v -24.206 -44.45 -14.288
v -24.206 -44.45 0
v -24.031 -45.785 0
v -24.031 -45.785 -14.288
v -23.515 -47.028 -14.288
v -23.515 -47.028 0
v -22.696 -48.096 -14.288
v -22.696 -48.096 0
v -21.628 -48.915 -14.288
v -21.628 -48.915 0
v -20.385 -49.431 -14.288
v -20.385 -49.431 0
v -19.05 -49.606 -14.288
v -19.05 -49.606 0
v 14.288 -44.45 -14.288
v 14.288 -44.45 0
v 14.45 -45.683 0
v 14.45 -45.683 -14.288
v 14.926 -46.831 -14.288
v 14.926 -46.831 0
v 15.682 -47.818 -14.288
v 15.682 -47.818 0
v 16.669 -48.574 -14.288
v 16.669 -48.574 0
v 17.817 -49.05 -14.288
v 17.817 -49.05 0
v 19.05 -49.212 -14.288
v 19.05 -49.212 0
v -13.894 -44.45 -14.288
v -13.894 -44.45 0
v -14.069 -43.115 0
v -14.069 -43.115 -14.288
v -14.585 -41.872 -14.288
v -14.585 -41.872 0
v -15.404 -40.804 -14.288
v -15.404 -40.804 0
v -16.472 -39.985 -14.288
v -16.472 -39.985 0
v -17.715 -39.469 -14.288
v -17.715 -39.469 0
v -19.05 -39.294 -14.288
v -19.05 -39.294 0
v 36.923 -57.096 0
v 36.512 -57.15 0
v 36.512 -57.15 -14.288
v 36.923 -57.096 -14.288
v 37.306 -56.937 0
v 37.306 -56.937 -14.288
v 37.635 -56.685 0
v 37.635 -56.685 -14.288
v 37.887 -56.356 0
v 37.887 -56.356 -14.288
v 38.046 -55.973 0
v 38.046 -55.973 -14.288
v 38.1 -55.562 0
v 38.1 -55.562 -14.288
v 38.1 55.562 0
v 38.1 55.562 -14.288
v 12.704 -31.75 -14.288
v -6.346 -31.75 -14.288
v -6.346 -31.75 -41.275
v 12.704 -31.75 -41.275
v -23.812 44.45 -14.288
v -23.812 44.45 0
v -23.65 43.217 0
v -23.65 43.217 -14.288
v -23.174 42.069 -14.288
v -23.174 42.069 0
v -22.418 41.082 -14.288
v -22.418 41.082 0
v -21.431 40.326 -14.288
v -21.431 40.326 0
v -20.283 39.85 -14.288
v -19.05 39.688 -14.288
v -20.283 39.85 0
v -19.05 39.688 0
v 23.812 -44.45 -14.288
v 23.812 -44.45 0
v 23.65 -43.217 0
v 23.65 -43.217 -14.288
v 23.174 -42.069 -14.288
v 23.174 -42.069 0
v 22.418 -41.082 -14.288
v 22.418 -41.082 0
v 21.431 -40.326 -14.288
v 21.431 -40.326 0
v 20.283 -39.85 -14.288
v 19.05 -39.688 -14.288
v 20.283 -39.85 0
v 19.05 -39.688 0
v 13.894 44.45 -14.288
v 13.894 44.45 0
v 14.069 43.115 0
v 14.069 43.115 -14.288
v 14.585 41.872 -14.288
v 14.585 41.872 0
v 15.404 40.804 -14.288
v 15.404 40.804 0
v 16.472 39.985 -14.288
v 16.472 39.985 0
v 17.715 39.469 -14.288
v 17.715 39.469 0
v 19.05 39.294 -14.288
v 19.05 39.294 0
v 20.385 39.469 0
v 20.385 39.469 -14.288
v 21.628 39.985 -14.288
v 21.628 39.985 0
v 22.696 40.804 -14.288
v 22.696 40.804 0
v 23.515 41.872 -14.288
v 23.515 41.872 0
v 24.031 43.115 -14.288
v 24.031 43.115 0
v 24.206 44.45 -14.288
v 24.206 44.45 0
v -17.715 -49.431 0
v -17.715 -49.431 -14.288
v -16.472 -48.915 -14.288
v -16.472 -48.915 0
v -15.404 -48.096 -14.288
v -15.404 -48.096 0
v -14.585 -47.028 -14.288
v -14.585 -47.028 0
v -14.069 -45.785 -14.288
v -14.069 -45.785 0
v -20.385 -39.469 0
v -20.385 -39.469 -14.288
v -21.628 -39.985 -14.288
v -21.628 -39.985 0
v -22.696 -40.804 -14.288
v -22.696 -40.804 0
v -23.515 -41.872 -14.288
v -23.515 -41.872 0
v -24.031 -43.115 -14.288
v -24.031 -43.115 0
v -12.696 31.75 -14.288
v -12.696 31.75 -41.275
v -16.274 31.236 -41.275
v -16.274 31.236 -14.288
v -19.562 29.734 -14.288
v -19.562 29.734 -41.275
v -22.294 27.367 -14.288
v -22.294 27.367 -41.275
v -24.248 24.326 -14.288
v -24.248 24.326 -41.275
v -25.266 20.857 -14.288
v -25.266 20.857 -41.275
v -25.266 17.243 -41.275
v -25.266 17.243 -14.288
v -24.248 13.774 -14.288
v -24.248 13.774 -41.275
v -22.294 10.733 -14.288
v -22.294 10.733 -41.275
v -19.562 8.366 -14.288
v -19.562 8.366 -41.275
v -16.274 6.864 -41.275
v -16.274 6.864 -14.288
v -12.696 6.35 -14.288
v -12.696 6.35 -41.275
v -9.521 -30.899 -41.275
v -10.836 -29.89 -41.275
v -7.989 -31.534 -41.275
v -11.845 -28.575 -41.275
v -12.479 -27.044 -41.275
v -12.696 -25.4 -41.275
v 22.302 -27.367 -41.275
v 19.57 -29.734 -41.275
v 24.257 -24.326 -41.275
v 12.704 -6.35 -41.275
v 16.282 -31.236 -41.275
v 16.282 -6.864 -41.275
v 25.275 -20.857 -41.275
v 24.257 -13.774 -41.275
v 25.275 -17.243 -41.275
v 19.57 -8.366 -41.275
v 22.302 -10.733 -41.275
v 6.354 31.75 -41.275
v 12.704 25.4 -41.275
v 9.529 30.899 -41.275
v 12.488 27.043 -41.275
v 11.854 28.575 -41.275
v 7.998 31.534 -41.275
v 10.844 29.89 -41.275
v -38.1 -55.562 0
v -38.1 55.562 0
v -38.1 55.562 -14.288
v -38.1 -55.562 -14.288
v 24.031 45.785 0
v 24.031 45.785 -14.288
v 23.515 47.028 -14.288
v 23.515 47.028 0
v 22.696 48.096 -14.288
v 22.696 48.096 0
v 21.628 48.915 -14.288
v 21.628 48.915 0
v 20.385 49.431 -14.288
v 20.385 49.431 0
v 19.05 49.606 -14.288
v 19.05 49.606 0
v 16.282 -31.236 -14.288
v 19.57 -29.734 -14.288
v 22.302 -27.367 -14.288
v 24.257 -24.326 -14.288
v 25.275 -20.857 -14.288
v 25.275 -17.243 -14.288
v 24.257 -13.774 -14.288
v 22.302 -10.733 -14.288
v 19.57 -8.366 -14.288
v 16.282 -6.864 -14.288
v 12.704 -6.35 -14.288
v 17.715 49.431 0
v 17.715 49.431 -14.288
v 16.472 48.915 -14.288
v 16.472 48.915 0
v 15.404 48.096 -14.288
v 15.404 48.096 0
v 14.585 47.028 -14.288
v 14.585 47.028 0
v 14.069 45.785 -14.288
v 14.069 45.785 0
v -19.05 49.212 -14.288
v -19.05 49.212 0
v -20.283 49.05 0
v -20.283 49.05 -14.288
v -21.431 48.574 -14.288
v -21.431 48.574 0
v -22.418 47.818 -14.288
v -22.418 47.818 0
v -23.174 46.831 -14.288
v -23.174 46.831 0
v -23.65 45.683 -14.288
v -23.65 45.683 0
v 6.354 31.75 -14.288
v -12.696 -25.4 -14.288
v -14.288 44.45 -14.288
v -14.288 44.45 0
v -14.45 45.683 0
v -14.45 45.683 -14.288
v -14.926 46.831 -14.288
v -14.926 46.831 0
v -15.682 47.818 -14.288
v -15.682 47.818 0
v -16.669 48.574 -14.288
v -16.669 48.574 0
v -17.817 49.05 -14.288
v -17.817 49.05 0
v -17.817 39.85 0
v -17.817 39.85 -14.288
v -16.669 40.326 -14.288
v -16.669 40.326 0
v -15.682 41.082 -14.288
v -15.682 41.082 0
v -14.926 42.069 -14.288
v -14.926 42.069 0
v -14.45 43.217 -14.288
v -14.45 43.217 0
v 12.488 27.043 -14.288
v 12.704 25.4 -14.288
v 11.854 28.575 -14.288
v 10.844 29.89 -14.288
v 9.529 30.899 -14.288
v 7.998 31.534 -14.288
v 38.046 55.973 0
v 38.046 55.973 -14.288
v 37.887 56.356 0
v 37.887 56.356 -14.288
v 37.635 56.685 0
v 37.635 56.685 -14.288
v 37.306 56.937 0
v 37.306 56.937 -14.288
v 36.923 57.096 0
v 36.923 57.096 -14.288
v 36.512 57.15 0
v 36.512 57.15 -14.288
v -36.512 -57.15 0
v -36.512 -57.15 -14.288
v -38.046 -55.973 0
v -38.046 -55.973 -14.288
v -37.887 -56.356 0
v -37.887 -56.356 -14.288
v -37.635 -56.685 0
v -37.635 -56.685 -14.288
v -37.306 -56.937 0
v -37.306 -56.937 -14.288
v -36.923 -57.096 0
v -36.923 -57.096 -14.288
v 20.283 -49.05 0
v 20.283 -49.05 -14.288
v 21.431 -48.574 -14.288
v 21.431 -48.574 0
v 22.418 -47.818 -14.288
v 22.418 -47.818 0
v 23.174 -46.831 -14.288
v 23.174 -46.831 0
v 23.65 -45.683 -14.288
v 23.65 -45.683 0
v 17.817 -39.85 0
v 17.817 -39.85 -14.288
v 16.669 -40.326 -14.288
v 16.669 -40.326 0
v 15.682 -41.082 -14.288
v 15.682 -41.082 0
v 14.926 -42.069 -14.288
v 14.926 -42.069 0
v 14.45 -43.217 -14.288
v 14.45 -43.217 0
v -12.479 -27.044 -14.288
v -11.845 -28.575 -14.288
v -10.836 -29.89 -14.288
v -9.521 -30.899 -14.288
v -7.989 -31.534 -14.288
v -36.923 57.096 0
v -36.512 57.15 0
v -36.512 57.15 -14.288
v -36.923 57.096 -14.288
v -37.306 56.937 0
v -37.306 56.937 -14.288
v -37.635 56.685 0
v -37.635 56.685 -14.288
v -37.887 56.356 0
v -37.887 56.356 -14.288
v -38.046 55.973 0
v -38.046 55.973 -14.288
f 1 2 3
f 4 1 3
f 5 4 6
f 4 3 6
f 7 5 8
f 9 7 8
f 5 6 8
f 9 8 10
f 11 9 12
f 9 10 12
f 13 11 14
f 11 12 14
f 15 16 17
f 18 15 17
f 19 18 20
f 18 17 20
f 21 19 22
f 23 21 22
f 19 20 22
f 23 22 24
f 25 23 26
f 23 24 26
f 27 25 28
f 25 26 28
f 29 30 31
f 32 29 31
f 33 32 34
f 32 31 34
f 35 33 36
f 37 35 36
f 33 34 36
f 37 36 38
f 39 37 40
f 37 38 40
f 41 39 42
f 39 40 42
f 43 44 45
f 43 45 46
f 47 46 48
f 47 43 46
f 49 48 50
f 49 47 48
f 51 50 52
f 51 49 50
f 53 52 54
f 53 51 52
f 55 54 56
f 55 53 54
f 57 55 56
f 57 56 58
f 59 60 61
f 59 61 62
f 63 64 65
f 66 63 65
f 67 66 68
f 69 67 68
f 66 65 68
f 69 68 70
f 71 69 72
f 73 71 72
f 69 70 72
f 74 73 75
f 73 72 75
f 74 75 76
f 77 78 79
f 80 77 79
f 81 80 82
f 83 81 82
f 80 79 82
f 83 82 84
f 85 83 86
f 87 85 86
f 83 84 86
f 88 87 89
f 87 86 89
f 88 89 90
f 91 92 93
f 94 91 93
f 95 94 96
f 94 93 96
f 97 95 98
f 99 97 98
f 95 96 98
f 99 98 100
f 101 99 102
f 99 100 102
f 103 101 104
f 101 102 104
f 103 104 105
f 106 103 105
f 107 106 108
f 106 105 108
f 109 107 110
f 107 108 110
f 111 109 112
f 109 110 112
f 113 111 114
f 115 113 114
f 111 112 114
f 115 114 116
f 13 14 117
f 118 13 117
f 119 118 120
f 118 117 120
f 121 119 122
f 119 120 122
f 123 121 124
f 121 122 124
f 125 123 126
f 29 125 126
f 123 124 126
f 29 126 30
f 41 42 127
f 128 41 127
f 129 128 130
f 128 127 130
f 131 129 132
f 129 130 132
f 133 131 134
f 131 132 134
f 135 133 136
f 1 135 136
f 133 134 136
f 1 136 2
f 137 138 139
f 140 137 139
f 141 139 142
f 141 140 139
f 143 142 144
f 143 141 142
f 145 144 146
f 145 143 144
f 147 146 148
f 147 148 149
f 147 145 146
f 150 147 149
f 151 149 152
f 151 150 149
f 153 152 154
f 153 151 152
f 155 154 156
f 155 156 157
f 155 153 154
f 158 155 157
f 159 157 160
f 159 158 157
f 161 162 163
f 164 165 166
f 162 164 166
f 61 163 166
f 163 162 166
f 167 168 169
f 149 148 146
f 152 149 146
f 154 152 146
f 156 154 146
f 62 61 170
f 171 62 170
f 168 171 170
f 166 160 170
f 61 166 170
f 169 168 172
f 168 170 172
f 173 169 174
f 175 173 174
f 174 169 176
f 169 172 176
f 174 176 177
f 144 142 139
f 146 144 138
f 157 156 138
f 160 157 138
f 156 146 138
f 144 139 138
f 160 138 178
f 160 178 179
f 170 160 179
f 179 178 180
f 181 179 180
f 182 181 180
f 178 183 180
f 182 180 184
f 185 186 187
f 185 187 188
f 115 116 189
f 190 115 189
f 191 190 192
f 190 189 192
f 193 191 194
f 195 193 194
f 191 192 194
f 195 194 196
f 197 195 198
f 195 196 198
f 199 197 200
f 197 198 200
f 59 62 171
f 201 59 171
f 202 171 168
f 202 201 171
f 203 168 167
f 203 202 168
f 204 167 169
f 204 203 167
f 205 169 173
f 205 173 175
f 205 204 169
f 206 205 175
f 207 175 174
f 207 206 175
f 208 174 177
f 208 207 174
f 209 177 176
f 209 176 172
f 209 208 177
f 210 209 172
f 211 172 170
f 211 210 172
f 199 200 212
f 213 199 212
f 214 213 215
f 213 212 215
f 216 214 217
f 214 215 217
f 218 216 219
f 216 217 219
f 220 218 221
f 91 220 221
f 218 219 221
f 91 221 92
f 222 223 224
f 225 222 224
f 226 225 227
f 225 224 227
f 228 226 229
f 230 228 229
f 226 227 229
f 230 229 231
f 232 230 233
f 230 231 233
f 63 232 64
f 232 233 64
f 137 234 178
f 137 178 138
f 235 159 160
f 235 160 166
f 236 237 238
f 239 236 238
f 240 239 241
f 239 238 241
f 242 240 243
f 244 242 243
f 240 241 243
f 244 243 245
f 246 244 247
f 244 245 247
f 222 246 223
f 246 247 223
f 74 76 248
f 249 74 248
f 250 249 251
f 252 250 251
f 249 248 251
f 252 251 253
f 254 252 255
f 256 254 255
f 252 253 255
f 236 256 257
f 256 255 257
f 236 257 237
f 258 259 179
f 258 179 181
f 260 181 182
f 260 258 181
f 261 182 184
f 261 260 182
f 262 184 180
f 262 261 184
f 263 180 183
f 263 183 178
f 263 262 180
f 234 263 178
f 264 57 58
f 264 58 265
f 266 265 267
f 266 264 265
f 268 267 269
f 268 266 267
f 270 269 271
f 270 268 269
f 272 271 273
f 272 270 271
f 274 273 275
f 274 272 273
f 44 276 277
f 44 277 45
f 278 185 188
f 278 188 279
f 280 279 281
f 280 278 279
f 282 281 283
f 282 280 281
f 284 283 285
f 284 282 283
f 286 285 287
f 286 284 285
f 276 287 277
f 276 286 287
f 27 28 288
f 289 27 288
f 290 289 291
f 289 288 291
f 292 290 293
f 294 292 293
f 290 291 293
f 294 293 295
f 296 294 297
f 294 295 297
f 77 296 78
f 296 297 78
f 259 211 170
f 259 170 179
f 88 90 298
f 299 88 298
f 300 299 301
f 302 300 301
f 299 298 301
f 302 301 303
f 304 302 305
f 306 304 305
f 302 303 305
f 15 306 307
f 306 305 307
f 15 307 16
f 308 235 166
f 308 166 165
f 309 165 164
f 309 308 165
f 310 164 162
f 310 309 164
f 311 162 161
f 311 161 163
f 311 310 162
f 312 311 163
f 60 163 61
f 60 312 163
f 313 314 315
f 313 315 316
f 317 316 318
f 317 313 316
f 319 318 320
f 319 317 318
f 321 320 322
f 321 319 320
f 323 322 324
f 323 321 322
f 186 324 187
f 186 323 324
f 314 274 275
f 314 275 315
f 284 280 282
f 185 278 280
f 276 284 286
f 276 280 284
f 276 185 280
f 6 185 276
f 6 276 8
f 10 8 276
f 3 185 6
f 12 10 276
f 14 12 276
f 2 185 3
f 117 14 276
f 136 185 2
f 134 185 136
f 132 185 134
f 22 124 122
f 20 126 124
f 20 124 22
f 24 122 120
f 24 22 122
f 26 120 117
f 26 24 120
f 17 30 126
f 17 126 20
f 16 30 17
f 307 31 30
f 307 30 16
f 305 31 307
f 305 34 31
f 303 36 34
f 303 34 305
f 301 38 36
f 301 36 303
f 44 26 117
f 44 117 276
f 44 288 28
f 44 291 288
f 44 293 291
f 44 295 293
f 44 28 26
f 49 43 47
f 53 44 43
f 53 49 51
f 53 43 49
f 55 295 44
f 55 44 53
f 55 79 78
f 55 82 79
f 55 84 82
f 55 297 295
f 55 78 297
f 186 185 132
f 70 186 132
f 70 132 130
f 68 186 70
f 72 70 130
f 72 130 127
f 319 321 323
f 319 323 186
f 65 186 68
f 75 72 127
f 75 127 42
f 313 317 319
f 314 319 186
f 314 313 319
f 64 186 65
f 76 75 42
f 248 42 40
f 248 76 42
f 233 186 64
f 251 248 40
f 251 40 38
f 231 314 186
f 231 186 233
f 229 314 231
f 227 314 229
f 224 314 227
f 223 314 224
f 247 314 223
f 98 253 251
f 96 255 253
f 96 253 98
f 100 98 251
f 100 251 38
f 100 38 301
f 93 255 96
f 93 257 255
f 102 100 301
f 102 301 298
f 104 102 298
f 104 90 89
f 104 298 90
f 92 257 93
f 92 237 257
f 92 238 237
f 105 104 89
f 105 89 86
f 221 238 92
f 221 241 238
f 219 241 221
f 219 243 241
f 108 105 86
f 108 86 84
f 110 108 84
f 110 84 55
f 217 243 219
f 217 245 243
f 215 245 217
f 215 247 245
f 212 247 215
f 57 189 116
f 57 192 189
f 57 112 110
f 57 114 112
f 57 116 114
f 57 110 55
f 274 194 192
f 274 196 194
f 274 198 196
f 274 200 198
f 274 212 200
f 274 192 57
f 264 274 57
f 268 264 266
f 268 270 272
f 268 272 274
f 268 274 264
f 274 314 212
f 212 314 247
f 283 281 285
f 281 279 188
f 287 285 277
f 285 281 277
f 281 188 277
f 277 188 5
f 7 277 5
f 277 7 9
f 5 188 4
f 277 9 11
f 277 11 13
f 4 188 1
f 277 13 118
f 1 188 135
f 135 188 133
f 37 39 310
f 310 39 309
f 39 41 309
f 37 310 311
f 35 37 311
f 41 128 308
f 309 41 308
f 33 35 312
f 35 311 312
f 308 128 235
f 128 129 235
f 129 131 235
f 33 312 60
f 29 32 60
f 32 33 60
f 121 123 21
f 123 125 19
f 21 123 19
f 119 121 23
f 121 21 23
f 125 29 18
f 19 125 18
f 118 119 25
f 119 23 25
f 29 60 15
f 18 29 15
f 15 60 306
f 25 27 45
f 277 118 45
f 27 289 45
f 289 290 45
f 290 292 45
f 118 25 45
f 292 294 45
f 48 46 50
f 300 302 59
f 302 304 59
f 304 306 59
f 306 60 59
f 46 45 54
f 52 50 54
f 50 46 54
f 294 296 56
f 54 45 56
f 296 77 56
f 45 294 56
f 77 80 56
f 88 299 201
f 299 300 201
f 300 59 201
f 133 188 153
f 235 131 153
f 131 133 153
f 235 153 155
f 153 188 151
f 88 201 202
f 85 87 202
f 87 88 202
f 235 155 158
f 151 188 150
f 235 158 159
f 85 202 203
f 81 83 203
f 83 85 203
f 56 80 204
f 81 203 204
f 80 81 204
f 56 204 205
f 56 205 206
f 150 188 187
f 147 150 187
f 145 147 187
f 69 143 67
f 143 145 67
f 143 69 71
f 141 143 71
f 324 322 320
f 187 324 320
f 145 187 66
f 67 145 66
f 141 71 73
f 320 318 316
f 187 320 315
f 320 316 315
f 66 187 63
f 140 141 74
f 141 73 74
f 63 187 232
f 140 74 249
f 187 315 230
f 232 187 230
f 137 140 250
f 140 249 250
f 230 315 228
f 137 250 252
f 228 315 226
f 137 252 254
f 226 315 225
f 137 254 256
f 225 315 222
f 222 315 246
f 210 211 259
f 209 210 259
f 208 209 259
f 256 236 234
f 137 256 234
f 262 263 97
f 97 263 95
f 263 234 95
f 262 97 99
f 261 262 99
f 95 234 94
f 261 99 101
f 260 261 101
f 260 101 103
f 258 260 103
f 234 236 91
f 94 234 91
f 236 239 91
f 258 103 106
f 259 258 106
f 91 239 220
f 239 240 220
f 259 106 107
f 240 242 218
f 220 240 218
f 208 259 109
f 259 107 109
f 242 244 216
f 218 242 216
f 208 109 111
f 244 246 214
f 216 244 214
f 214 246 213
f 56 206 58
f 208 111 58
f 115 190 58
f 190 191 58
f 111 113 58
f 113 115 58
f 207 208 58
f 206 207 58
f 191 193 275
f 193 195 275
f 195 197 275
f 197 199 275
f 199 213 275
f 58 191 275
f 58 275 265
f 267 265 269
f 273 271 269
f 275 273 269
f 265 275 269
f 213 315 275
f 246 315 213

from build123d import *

# Parameters (mm, degrees)
F1_DEPTH = 41.275
F3_DEPTH = 14.2875
F5_DEPTH = 14.2875


with BuildPart() as f1:
    # F0 (on Top) → F1 (new body)
    with BuildSketch(Plane.XY):
        with BuildLine():
            Line((-6.3457395977, -31.7500010133), (12.7042604023, -31.7500010133))
            ThreePointArc((12.7042604023, -31.7500010133), (25.4042604023, -19.0500010133), (12.7042604023, -6.3500010133))
            Line((12.7042604023, -6.3500010133), (12.7042604023, 25.3999989867))
            ThreePointArc((12.7042604023, 25.3999989867), (10.8443884629, 29.8901270473), (6.3542604023, 31.7499989867))
            Line((6.3542604023, 31.7499989867), (-12.6957395977, 31.7499989867))
            ThreePointArc((-12.6957395977, 31.7499989867), (-25.3957395977, 19.0499989867), (-12.6957395977, 6.3499989867))
            Line((-12.6957395977, 6.3499989867), (-12.6957395977, -25.4000010133))
            ThreePointArc((-12.6957395977, -25.4000010133), (-10.8358676582, -29.8901290738), (-6.3457395977, -31.7500010133))
        make_face()
    extrude(amount=-F1_DEPTH)

    # F2 (on face) → F3 (join)
    with BuildSketch(Plane.XY):
        with BuildLine():
            Line((-36.5125, -57.15), (36.5125, -57.15))
            ThreePointArc((36.5125, -57.15), (37.6350320151, -56.6850320151), (38.1, -55.5625))
            Line((38.1, -55.5625), (38.1, 55.5625))
            ThreePointArc((38.1, 55.5625), (37.6350320151, 56.6850320151), (36.5125, 57.15))
            Line((36.5125, 57.15), (-36.5125, 57.15))
            ThreePointArc((-36.5125, 57.15), (-37.6350320151, 56.6850320151), (-38.1, 55.5625))
            Line((-38.1, 55.5625), (-38.1, -55.5625))
            ThreePointArc((-38.1, -55.5625), (-37.6350320151, -56.6850320151), (-36.5125, -57.15))
        make_face()
        with BuildLine():
            Line((-12.6957395977, 31.7499989867), (6.3542604023, 31.7499989867))
            ThreePointArc((6.3542604023, 31.7499989867), (10.8443884629, 29.8901270473), (12.7042604023, 25.3999989867))
            Line((12.7042604023, 25.3999989867), (12.7042604023, -6.3500010133))
            ThreePointArc((12.7042604023, -6.3500010133), (25.4042604023, -19.0500010133), (12.7042604023, -31.7500010133))
            Line((12.7042604023, -31.7500010133), (-6.3457395977, -31.7500010133))
            ThreePointArc((-6.3457395977, -31.7500010133), (-10.8358676582, -29.8901290738), (-12.6957395977, -25.4000010133))
            Line((-12.6957395977, -25.4000010133), (-12.6957395977, 6.3499989867))
            ThreePointArc((-12.6957395977, 6.3499989867), (-25.3957395977, 19.0499989867), (-12.6957395977, 31.7499989867))
        make_face(mode=Mode.SUBTRACT)
    extrude(amount=-F3_DEPTH)

    # F4 (on face) → F5 (cut)
    with BuildSketch(Plane.XY):
        with BuildLine():
            Line((19.05, 39.2938), (19.05, 44.45))
            Line((19.05, 44.45), (13.8938, 44.45))
            ThreePointArc((13.8938, 44.45), (15.4040160148, 40.8040160148), (19.05, 39.2938))
        make_face()
        with BuildLine():
            Line((19.05, 44.45), (24.2062, 44.45))
            ThreePointArc((24.2062, 44.45), (22.6959839852, 48.0959839852), (19.05, 49.6062))
            Line((19.05, 49.6062), (19.05, 44.45))
        make_face()
        with BuildLine():
            Line((19.05, 44.45), (19.05, 49.6062))
            ThreePointArc((19.05, 49.6062), (15.4040160148, 48.0959839852), (13.8938, 44.45))
            Line((13.8938, 44.45), (19.05, 44.45))
        make_face()
        with BuildLine():
            ThreePointArc((19.05, 39.2938), (22.6959839852, 40.8040160148), (24.2062, 44.45))
            Line((24.2062, 44.45), (19.05, 44.45))
            Line((19.05, 44.45), (19.05, 39.2938))
        make_face()
        with BuildLine():
            Line((-19.05, -44.45), (-13.8938, -44.45))
            ThreePointArc((-13.8938, -44.45), (-15.4040160148, -40.8040160148), (-19.05, -39.2938))
            Line((-19.05, -39.2938), (-19.05, -44.45))
        make_face()
        with BuildLine():
            ThreePointArc((-19.05, -49.6062), (-15.4040160148, -48.0959839852), (-13.8938, -44.45))
            Line((-13.8938, -44.45), (-19.05, -44.45))
            Line((-19.05, -44.45), (-19.05, -49.6062))
        make_face()
        with BuildLine():
            ThreePointArc((-24.2062, -44.45), (-22.6959839852, -48.0959839852), (-19.05, -49.6062))
            Line((-19.05, -49.6062), (-19.05, -44.45))
            Line((-19.05, -44.45), (-24.2062, -44.45))
        make_face()
        with BuildLine():
            Line((-24.2062, -44.45), (-19.05, -44.45))
            Line((-19.05, -44.45), (-19.05, -39.2938))
            ThreePointArc((-19.05, -39.2938), (-22.6959839852, -40.8040160148), (-24.2062, -44.45))
        make_face()
        with BuildLine():
            Line((-14.2875, 44.45), (-19.05, 44.45))
            Line((-19.05, 44.45), (-19.05, 39.6875))
            ThreePointArc((-19.05, 39.6875), (-15.6824039546, 41.0824039546), (-14.2875, 44.45))
        make_face()
        with BuildLine():
            ThreePointArc((-14.2875, 44.45), (-15.6824039546, 47.8175960454), (-19.05, 49.2125))
            Line((-19.05, 49.2125), (-19.05, 44.45))
            Line((-19.05, 44.45), (-14.2875, 44.45))
        make_face()
        with BuildLine():
            Line((-19.05, 44.45), (-19.05, 49.2125))
            ThreePointArc((-19.05, 49.2125), (-22.4175960454, 47.8175960454), (-23.8125, 44.45))
            Line((-23.8125, 44.45), (-19.05, 44.45))
        make_face()
        with BuildLine():
            Line((-19.05, 39.6875), (-19.05, 44.45))
            Line((-19.05, 44.45), (-23.8125, 44.45))
            ThreePointArc((-23.8125, 44.45), (-22.4175960454, 41.0824039546), (-19.05, 39.6875))
        make_face()
        with BuildLine():
            Line((19.05, -44.45), (23.8125, -44.45))
            ThreePointArc((23.8125, -44.45), (22.4175960454, -41.0824039546), (19.05, -39.6875))
            Line((19.05, -39.6875), (19.05, -44.45))
        make_face()
        with BuildLine():
            Line((14.2875, -44.45), (19.05, -44.45))
            Line((19.05, -44.45), (19.05, -39.6875))
            ThreePointArc((19.05, -39.6875), (15.6824039546, -41.0824039546), (14.2875, -44.45))
        make_face()
        with BuildLine():
            Line((19.05, -49.2125), (19.05, -44.45))
            Line((19.05, -44.45), (14.2875, -44.45))
            ThreePointArc((14.2875, -44.45), (15.6824039546, -47.8175960454), (19.05, -49.2125))
        make_face()
        with BuildLine():
            ThreePointArc((19.05, -49.2125), (22.4175960454, -47.8175960454), (23.8125, -44.45))
            Line((23.8125, -44.45), (19.05, -44.45))
            Line((19.05, -44.45), (19.05, -49.2125))
        make_face()
    extrude(amount=-F5_DEPTH, mode=Mode.SUBTRACT)


solid = f1.part
